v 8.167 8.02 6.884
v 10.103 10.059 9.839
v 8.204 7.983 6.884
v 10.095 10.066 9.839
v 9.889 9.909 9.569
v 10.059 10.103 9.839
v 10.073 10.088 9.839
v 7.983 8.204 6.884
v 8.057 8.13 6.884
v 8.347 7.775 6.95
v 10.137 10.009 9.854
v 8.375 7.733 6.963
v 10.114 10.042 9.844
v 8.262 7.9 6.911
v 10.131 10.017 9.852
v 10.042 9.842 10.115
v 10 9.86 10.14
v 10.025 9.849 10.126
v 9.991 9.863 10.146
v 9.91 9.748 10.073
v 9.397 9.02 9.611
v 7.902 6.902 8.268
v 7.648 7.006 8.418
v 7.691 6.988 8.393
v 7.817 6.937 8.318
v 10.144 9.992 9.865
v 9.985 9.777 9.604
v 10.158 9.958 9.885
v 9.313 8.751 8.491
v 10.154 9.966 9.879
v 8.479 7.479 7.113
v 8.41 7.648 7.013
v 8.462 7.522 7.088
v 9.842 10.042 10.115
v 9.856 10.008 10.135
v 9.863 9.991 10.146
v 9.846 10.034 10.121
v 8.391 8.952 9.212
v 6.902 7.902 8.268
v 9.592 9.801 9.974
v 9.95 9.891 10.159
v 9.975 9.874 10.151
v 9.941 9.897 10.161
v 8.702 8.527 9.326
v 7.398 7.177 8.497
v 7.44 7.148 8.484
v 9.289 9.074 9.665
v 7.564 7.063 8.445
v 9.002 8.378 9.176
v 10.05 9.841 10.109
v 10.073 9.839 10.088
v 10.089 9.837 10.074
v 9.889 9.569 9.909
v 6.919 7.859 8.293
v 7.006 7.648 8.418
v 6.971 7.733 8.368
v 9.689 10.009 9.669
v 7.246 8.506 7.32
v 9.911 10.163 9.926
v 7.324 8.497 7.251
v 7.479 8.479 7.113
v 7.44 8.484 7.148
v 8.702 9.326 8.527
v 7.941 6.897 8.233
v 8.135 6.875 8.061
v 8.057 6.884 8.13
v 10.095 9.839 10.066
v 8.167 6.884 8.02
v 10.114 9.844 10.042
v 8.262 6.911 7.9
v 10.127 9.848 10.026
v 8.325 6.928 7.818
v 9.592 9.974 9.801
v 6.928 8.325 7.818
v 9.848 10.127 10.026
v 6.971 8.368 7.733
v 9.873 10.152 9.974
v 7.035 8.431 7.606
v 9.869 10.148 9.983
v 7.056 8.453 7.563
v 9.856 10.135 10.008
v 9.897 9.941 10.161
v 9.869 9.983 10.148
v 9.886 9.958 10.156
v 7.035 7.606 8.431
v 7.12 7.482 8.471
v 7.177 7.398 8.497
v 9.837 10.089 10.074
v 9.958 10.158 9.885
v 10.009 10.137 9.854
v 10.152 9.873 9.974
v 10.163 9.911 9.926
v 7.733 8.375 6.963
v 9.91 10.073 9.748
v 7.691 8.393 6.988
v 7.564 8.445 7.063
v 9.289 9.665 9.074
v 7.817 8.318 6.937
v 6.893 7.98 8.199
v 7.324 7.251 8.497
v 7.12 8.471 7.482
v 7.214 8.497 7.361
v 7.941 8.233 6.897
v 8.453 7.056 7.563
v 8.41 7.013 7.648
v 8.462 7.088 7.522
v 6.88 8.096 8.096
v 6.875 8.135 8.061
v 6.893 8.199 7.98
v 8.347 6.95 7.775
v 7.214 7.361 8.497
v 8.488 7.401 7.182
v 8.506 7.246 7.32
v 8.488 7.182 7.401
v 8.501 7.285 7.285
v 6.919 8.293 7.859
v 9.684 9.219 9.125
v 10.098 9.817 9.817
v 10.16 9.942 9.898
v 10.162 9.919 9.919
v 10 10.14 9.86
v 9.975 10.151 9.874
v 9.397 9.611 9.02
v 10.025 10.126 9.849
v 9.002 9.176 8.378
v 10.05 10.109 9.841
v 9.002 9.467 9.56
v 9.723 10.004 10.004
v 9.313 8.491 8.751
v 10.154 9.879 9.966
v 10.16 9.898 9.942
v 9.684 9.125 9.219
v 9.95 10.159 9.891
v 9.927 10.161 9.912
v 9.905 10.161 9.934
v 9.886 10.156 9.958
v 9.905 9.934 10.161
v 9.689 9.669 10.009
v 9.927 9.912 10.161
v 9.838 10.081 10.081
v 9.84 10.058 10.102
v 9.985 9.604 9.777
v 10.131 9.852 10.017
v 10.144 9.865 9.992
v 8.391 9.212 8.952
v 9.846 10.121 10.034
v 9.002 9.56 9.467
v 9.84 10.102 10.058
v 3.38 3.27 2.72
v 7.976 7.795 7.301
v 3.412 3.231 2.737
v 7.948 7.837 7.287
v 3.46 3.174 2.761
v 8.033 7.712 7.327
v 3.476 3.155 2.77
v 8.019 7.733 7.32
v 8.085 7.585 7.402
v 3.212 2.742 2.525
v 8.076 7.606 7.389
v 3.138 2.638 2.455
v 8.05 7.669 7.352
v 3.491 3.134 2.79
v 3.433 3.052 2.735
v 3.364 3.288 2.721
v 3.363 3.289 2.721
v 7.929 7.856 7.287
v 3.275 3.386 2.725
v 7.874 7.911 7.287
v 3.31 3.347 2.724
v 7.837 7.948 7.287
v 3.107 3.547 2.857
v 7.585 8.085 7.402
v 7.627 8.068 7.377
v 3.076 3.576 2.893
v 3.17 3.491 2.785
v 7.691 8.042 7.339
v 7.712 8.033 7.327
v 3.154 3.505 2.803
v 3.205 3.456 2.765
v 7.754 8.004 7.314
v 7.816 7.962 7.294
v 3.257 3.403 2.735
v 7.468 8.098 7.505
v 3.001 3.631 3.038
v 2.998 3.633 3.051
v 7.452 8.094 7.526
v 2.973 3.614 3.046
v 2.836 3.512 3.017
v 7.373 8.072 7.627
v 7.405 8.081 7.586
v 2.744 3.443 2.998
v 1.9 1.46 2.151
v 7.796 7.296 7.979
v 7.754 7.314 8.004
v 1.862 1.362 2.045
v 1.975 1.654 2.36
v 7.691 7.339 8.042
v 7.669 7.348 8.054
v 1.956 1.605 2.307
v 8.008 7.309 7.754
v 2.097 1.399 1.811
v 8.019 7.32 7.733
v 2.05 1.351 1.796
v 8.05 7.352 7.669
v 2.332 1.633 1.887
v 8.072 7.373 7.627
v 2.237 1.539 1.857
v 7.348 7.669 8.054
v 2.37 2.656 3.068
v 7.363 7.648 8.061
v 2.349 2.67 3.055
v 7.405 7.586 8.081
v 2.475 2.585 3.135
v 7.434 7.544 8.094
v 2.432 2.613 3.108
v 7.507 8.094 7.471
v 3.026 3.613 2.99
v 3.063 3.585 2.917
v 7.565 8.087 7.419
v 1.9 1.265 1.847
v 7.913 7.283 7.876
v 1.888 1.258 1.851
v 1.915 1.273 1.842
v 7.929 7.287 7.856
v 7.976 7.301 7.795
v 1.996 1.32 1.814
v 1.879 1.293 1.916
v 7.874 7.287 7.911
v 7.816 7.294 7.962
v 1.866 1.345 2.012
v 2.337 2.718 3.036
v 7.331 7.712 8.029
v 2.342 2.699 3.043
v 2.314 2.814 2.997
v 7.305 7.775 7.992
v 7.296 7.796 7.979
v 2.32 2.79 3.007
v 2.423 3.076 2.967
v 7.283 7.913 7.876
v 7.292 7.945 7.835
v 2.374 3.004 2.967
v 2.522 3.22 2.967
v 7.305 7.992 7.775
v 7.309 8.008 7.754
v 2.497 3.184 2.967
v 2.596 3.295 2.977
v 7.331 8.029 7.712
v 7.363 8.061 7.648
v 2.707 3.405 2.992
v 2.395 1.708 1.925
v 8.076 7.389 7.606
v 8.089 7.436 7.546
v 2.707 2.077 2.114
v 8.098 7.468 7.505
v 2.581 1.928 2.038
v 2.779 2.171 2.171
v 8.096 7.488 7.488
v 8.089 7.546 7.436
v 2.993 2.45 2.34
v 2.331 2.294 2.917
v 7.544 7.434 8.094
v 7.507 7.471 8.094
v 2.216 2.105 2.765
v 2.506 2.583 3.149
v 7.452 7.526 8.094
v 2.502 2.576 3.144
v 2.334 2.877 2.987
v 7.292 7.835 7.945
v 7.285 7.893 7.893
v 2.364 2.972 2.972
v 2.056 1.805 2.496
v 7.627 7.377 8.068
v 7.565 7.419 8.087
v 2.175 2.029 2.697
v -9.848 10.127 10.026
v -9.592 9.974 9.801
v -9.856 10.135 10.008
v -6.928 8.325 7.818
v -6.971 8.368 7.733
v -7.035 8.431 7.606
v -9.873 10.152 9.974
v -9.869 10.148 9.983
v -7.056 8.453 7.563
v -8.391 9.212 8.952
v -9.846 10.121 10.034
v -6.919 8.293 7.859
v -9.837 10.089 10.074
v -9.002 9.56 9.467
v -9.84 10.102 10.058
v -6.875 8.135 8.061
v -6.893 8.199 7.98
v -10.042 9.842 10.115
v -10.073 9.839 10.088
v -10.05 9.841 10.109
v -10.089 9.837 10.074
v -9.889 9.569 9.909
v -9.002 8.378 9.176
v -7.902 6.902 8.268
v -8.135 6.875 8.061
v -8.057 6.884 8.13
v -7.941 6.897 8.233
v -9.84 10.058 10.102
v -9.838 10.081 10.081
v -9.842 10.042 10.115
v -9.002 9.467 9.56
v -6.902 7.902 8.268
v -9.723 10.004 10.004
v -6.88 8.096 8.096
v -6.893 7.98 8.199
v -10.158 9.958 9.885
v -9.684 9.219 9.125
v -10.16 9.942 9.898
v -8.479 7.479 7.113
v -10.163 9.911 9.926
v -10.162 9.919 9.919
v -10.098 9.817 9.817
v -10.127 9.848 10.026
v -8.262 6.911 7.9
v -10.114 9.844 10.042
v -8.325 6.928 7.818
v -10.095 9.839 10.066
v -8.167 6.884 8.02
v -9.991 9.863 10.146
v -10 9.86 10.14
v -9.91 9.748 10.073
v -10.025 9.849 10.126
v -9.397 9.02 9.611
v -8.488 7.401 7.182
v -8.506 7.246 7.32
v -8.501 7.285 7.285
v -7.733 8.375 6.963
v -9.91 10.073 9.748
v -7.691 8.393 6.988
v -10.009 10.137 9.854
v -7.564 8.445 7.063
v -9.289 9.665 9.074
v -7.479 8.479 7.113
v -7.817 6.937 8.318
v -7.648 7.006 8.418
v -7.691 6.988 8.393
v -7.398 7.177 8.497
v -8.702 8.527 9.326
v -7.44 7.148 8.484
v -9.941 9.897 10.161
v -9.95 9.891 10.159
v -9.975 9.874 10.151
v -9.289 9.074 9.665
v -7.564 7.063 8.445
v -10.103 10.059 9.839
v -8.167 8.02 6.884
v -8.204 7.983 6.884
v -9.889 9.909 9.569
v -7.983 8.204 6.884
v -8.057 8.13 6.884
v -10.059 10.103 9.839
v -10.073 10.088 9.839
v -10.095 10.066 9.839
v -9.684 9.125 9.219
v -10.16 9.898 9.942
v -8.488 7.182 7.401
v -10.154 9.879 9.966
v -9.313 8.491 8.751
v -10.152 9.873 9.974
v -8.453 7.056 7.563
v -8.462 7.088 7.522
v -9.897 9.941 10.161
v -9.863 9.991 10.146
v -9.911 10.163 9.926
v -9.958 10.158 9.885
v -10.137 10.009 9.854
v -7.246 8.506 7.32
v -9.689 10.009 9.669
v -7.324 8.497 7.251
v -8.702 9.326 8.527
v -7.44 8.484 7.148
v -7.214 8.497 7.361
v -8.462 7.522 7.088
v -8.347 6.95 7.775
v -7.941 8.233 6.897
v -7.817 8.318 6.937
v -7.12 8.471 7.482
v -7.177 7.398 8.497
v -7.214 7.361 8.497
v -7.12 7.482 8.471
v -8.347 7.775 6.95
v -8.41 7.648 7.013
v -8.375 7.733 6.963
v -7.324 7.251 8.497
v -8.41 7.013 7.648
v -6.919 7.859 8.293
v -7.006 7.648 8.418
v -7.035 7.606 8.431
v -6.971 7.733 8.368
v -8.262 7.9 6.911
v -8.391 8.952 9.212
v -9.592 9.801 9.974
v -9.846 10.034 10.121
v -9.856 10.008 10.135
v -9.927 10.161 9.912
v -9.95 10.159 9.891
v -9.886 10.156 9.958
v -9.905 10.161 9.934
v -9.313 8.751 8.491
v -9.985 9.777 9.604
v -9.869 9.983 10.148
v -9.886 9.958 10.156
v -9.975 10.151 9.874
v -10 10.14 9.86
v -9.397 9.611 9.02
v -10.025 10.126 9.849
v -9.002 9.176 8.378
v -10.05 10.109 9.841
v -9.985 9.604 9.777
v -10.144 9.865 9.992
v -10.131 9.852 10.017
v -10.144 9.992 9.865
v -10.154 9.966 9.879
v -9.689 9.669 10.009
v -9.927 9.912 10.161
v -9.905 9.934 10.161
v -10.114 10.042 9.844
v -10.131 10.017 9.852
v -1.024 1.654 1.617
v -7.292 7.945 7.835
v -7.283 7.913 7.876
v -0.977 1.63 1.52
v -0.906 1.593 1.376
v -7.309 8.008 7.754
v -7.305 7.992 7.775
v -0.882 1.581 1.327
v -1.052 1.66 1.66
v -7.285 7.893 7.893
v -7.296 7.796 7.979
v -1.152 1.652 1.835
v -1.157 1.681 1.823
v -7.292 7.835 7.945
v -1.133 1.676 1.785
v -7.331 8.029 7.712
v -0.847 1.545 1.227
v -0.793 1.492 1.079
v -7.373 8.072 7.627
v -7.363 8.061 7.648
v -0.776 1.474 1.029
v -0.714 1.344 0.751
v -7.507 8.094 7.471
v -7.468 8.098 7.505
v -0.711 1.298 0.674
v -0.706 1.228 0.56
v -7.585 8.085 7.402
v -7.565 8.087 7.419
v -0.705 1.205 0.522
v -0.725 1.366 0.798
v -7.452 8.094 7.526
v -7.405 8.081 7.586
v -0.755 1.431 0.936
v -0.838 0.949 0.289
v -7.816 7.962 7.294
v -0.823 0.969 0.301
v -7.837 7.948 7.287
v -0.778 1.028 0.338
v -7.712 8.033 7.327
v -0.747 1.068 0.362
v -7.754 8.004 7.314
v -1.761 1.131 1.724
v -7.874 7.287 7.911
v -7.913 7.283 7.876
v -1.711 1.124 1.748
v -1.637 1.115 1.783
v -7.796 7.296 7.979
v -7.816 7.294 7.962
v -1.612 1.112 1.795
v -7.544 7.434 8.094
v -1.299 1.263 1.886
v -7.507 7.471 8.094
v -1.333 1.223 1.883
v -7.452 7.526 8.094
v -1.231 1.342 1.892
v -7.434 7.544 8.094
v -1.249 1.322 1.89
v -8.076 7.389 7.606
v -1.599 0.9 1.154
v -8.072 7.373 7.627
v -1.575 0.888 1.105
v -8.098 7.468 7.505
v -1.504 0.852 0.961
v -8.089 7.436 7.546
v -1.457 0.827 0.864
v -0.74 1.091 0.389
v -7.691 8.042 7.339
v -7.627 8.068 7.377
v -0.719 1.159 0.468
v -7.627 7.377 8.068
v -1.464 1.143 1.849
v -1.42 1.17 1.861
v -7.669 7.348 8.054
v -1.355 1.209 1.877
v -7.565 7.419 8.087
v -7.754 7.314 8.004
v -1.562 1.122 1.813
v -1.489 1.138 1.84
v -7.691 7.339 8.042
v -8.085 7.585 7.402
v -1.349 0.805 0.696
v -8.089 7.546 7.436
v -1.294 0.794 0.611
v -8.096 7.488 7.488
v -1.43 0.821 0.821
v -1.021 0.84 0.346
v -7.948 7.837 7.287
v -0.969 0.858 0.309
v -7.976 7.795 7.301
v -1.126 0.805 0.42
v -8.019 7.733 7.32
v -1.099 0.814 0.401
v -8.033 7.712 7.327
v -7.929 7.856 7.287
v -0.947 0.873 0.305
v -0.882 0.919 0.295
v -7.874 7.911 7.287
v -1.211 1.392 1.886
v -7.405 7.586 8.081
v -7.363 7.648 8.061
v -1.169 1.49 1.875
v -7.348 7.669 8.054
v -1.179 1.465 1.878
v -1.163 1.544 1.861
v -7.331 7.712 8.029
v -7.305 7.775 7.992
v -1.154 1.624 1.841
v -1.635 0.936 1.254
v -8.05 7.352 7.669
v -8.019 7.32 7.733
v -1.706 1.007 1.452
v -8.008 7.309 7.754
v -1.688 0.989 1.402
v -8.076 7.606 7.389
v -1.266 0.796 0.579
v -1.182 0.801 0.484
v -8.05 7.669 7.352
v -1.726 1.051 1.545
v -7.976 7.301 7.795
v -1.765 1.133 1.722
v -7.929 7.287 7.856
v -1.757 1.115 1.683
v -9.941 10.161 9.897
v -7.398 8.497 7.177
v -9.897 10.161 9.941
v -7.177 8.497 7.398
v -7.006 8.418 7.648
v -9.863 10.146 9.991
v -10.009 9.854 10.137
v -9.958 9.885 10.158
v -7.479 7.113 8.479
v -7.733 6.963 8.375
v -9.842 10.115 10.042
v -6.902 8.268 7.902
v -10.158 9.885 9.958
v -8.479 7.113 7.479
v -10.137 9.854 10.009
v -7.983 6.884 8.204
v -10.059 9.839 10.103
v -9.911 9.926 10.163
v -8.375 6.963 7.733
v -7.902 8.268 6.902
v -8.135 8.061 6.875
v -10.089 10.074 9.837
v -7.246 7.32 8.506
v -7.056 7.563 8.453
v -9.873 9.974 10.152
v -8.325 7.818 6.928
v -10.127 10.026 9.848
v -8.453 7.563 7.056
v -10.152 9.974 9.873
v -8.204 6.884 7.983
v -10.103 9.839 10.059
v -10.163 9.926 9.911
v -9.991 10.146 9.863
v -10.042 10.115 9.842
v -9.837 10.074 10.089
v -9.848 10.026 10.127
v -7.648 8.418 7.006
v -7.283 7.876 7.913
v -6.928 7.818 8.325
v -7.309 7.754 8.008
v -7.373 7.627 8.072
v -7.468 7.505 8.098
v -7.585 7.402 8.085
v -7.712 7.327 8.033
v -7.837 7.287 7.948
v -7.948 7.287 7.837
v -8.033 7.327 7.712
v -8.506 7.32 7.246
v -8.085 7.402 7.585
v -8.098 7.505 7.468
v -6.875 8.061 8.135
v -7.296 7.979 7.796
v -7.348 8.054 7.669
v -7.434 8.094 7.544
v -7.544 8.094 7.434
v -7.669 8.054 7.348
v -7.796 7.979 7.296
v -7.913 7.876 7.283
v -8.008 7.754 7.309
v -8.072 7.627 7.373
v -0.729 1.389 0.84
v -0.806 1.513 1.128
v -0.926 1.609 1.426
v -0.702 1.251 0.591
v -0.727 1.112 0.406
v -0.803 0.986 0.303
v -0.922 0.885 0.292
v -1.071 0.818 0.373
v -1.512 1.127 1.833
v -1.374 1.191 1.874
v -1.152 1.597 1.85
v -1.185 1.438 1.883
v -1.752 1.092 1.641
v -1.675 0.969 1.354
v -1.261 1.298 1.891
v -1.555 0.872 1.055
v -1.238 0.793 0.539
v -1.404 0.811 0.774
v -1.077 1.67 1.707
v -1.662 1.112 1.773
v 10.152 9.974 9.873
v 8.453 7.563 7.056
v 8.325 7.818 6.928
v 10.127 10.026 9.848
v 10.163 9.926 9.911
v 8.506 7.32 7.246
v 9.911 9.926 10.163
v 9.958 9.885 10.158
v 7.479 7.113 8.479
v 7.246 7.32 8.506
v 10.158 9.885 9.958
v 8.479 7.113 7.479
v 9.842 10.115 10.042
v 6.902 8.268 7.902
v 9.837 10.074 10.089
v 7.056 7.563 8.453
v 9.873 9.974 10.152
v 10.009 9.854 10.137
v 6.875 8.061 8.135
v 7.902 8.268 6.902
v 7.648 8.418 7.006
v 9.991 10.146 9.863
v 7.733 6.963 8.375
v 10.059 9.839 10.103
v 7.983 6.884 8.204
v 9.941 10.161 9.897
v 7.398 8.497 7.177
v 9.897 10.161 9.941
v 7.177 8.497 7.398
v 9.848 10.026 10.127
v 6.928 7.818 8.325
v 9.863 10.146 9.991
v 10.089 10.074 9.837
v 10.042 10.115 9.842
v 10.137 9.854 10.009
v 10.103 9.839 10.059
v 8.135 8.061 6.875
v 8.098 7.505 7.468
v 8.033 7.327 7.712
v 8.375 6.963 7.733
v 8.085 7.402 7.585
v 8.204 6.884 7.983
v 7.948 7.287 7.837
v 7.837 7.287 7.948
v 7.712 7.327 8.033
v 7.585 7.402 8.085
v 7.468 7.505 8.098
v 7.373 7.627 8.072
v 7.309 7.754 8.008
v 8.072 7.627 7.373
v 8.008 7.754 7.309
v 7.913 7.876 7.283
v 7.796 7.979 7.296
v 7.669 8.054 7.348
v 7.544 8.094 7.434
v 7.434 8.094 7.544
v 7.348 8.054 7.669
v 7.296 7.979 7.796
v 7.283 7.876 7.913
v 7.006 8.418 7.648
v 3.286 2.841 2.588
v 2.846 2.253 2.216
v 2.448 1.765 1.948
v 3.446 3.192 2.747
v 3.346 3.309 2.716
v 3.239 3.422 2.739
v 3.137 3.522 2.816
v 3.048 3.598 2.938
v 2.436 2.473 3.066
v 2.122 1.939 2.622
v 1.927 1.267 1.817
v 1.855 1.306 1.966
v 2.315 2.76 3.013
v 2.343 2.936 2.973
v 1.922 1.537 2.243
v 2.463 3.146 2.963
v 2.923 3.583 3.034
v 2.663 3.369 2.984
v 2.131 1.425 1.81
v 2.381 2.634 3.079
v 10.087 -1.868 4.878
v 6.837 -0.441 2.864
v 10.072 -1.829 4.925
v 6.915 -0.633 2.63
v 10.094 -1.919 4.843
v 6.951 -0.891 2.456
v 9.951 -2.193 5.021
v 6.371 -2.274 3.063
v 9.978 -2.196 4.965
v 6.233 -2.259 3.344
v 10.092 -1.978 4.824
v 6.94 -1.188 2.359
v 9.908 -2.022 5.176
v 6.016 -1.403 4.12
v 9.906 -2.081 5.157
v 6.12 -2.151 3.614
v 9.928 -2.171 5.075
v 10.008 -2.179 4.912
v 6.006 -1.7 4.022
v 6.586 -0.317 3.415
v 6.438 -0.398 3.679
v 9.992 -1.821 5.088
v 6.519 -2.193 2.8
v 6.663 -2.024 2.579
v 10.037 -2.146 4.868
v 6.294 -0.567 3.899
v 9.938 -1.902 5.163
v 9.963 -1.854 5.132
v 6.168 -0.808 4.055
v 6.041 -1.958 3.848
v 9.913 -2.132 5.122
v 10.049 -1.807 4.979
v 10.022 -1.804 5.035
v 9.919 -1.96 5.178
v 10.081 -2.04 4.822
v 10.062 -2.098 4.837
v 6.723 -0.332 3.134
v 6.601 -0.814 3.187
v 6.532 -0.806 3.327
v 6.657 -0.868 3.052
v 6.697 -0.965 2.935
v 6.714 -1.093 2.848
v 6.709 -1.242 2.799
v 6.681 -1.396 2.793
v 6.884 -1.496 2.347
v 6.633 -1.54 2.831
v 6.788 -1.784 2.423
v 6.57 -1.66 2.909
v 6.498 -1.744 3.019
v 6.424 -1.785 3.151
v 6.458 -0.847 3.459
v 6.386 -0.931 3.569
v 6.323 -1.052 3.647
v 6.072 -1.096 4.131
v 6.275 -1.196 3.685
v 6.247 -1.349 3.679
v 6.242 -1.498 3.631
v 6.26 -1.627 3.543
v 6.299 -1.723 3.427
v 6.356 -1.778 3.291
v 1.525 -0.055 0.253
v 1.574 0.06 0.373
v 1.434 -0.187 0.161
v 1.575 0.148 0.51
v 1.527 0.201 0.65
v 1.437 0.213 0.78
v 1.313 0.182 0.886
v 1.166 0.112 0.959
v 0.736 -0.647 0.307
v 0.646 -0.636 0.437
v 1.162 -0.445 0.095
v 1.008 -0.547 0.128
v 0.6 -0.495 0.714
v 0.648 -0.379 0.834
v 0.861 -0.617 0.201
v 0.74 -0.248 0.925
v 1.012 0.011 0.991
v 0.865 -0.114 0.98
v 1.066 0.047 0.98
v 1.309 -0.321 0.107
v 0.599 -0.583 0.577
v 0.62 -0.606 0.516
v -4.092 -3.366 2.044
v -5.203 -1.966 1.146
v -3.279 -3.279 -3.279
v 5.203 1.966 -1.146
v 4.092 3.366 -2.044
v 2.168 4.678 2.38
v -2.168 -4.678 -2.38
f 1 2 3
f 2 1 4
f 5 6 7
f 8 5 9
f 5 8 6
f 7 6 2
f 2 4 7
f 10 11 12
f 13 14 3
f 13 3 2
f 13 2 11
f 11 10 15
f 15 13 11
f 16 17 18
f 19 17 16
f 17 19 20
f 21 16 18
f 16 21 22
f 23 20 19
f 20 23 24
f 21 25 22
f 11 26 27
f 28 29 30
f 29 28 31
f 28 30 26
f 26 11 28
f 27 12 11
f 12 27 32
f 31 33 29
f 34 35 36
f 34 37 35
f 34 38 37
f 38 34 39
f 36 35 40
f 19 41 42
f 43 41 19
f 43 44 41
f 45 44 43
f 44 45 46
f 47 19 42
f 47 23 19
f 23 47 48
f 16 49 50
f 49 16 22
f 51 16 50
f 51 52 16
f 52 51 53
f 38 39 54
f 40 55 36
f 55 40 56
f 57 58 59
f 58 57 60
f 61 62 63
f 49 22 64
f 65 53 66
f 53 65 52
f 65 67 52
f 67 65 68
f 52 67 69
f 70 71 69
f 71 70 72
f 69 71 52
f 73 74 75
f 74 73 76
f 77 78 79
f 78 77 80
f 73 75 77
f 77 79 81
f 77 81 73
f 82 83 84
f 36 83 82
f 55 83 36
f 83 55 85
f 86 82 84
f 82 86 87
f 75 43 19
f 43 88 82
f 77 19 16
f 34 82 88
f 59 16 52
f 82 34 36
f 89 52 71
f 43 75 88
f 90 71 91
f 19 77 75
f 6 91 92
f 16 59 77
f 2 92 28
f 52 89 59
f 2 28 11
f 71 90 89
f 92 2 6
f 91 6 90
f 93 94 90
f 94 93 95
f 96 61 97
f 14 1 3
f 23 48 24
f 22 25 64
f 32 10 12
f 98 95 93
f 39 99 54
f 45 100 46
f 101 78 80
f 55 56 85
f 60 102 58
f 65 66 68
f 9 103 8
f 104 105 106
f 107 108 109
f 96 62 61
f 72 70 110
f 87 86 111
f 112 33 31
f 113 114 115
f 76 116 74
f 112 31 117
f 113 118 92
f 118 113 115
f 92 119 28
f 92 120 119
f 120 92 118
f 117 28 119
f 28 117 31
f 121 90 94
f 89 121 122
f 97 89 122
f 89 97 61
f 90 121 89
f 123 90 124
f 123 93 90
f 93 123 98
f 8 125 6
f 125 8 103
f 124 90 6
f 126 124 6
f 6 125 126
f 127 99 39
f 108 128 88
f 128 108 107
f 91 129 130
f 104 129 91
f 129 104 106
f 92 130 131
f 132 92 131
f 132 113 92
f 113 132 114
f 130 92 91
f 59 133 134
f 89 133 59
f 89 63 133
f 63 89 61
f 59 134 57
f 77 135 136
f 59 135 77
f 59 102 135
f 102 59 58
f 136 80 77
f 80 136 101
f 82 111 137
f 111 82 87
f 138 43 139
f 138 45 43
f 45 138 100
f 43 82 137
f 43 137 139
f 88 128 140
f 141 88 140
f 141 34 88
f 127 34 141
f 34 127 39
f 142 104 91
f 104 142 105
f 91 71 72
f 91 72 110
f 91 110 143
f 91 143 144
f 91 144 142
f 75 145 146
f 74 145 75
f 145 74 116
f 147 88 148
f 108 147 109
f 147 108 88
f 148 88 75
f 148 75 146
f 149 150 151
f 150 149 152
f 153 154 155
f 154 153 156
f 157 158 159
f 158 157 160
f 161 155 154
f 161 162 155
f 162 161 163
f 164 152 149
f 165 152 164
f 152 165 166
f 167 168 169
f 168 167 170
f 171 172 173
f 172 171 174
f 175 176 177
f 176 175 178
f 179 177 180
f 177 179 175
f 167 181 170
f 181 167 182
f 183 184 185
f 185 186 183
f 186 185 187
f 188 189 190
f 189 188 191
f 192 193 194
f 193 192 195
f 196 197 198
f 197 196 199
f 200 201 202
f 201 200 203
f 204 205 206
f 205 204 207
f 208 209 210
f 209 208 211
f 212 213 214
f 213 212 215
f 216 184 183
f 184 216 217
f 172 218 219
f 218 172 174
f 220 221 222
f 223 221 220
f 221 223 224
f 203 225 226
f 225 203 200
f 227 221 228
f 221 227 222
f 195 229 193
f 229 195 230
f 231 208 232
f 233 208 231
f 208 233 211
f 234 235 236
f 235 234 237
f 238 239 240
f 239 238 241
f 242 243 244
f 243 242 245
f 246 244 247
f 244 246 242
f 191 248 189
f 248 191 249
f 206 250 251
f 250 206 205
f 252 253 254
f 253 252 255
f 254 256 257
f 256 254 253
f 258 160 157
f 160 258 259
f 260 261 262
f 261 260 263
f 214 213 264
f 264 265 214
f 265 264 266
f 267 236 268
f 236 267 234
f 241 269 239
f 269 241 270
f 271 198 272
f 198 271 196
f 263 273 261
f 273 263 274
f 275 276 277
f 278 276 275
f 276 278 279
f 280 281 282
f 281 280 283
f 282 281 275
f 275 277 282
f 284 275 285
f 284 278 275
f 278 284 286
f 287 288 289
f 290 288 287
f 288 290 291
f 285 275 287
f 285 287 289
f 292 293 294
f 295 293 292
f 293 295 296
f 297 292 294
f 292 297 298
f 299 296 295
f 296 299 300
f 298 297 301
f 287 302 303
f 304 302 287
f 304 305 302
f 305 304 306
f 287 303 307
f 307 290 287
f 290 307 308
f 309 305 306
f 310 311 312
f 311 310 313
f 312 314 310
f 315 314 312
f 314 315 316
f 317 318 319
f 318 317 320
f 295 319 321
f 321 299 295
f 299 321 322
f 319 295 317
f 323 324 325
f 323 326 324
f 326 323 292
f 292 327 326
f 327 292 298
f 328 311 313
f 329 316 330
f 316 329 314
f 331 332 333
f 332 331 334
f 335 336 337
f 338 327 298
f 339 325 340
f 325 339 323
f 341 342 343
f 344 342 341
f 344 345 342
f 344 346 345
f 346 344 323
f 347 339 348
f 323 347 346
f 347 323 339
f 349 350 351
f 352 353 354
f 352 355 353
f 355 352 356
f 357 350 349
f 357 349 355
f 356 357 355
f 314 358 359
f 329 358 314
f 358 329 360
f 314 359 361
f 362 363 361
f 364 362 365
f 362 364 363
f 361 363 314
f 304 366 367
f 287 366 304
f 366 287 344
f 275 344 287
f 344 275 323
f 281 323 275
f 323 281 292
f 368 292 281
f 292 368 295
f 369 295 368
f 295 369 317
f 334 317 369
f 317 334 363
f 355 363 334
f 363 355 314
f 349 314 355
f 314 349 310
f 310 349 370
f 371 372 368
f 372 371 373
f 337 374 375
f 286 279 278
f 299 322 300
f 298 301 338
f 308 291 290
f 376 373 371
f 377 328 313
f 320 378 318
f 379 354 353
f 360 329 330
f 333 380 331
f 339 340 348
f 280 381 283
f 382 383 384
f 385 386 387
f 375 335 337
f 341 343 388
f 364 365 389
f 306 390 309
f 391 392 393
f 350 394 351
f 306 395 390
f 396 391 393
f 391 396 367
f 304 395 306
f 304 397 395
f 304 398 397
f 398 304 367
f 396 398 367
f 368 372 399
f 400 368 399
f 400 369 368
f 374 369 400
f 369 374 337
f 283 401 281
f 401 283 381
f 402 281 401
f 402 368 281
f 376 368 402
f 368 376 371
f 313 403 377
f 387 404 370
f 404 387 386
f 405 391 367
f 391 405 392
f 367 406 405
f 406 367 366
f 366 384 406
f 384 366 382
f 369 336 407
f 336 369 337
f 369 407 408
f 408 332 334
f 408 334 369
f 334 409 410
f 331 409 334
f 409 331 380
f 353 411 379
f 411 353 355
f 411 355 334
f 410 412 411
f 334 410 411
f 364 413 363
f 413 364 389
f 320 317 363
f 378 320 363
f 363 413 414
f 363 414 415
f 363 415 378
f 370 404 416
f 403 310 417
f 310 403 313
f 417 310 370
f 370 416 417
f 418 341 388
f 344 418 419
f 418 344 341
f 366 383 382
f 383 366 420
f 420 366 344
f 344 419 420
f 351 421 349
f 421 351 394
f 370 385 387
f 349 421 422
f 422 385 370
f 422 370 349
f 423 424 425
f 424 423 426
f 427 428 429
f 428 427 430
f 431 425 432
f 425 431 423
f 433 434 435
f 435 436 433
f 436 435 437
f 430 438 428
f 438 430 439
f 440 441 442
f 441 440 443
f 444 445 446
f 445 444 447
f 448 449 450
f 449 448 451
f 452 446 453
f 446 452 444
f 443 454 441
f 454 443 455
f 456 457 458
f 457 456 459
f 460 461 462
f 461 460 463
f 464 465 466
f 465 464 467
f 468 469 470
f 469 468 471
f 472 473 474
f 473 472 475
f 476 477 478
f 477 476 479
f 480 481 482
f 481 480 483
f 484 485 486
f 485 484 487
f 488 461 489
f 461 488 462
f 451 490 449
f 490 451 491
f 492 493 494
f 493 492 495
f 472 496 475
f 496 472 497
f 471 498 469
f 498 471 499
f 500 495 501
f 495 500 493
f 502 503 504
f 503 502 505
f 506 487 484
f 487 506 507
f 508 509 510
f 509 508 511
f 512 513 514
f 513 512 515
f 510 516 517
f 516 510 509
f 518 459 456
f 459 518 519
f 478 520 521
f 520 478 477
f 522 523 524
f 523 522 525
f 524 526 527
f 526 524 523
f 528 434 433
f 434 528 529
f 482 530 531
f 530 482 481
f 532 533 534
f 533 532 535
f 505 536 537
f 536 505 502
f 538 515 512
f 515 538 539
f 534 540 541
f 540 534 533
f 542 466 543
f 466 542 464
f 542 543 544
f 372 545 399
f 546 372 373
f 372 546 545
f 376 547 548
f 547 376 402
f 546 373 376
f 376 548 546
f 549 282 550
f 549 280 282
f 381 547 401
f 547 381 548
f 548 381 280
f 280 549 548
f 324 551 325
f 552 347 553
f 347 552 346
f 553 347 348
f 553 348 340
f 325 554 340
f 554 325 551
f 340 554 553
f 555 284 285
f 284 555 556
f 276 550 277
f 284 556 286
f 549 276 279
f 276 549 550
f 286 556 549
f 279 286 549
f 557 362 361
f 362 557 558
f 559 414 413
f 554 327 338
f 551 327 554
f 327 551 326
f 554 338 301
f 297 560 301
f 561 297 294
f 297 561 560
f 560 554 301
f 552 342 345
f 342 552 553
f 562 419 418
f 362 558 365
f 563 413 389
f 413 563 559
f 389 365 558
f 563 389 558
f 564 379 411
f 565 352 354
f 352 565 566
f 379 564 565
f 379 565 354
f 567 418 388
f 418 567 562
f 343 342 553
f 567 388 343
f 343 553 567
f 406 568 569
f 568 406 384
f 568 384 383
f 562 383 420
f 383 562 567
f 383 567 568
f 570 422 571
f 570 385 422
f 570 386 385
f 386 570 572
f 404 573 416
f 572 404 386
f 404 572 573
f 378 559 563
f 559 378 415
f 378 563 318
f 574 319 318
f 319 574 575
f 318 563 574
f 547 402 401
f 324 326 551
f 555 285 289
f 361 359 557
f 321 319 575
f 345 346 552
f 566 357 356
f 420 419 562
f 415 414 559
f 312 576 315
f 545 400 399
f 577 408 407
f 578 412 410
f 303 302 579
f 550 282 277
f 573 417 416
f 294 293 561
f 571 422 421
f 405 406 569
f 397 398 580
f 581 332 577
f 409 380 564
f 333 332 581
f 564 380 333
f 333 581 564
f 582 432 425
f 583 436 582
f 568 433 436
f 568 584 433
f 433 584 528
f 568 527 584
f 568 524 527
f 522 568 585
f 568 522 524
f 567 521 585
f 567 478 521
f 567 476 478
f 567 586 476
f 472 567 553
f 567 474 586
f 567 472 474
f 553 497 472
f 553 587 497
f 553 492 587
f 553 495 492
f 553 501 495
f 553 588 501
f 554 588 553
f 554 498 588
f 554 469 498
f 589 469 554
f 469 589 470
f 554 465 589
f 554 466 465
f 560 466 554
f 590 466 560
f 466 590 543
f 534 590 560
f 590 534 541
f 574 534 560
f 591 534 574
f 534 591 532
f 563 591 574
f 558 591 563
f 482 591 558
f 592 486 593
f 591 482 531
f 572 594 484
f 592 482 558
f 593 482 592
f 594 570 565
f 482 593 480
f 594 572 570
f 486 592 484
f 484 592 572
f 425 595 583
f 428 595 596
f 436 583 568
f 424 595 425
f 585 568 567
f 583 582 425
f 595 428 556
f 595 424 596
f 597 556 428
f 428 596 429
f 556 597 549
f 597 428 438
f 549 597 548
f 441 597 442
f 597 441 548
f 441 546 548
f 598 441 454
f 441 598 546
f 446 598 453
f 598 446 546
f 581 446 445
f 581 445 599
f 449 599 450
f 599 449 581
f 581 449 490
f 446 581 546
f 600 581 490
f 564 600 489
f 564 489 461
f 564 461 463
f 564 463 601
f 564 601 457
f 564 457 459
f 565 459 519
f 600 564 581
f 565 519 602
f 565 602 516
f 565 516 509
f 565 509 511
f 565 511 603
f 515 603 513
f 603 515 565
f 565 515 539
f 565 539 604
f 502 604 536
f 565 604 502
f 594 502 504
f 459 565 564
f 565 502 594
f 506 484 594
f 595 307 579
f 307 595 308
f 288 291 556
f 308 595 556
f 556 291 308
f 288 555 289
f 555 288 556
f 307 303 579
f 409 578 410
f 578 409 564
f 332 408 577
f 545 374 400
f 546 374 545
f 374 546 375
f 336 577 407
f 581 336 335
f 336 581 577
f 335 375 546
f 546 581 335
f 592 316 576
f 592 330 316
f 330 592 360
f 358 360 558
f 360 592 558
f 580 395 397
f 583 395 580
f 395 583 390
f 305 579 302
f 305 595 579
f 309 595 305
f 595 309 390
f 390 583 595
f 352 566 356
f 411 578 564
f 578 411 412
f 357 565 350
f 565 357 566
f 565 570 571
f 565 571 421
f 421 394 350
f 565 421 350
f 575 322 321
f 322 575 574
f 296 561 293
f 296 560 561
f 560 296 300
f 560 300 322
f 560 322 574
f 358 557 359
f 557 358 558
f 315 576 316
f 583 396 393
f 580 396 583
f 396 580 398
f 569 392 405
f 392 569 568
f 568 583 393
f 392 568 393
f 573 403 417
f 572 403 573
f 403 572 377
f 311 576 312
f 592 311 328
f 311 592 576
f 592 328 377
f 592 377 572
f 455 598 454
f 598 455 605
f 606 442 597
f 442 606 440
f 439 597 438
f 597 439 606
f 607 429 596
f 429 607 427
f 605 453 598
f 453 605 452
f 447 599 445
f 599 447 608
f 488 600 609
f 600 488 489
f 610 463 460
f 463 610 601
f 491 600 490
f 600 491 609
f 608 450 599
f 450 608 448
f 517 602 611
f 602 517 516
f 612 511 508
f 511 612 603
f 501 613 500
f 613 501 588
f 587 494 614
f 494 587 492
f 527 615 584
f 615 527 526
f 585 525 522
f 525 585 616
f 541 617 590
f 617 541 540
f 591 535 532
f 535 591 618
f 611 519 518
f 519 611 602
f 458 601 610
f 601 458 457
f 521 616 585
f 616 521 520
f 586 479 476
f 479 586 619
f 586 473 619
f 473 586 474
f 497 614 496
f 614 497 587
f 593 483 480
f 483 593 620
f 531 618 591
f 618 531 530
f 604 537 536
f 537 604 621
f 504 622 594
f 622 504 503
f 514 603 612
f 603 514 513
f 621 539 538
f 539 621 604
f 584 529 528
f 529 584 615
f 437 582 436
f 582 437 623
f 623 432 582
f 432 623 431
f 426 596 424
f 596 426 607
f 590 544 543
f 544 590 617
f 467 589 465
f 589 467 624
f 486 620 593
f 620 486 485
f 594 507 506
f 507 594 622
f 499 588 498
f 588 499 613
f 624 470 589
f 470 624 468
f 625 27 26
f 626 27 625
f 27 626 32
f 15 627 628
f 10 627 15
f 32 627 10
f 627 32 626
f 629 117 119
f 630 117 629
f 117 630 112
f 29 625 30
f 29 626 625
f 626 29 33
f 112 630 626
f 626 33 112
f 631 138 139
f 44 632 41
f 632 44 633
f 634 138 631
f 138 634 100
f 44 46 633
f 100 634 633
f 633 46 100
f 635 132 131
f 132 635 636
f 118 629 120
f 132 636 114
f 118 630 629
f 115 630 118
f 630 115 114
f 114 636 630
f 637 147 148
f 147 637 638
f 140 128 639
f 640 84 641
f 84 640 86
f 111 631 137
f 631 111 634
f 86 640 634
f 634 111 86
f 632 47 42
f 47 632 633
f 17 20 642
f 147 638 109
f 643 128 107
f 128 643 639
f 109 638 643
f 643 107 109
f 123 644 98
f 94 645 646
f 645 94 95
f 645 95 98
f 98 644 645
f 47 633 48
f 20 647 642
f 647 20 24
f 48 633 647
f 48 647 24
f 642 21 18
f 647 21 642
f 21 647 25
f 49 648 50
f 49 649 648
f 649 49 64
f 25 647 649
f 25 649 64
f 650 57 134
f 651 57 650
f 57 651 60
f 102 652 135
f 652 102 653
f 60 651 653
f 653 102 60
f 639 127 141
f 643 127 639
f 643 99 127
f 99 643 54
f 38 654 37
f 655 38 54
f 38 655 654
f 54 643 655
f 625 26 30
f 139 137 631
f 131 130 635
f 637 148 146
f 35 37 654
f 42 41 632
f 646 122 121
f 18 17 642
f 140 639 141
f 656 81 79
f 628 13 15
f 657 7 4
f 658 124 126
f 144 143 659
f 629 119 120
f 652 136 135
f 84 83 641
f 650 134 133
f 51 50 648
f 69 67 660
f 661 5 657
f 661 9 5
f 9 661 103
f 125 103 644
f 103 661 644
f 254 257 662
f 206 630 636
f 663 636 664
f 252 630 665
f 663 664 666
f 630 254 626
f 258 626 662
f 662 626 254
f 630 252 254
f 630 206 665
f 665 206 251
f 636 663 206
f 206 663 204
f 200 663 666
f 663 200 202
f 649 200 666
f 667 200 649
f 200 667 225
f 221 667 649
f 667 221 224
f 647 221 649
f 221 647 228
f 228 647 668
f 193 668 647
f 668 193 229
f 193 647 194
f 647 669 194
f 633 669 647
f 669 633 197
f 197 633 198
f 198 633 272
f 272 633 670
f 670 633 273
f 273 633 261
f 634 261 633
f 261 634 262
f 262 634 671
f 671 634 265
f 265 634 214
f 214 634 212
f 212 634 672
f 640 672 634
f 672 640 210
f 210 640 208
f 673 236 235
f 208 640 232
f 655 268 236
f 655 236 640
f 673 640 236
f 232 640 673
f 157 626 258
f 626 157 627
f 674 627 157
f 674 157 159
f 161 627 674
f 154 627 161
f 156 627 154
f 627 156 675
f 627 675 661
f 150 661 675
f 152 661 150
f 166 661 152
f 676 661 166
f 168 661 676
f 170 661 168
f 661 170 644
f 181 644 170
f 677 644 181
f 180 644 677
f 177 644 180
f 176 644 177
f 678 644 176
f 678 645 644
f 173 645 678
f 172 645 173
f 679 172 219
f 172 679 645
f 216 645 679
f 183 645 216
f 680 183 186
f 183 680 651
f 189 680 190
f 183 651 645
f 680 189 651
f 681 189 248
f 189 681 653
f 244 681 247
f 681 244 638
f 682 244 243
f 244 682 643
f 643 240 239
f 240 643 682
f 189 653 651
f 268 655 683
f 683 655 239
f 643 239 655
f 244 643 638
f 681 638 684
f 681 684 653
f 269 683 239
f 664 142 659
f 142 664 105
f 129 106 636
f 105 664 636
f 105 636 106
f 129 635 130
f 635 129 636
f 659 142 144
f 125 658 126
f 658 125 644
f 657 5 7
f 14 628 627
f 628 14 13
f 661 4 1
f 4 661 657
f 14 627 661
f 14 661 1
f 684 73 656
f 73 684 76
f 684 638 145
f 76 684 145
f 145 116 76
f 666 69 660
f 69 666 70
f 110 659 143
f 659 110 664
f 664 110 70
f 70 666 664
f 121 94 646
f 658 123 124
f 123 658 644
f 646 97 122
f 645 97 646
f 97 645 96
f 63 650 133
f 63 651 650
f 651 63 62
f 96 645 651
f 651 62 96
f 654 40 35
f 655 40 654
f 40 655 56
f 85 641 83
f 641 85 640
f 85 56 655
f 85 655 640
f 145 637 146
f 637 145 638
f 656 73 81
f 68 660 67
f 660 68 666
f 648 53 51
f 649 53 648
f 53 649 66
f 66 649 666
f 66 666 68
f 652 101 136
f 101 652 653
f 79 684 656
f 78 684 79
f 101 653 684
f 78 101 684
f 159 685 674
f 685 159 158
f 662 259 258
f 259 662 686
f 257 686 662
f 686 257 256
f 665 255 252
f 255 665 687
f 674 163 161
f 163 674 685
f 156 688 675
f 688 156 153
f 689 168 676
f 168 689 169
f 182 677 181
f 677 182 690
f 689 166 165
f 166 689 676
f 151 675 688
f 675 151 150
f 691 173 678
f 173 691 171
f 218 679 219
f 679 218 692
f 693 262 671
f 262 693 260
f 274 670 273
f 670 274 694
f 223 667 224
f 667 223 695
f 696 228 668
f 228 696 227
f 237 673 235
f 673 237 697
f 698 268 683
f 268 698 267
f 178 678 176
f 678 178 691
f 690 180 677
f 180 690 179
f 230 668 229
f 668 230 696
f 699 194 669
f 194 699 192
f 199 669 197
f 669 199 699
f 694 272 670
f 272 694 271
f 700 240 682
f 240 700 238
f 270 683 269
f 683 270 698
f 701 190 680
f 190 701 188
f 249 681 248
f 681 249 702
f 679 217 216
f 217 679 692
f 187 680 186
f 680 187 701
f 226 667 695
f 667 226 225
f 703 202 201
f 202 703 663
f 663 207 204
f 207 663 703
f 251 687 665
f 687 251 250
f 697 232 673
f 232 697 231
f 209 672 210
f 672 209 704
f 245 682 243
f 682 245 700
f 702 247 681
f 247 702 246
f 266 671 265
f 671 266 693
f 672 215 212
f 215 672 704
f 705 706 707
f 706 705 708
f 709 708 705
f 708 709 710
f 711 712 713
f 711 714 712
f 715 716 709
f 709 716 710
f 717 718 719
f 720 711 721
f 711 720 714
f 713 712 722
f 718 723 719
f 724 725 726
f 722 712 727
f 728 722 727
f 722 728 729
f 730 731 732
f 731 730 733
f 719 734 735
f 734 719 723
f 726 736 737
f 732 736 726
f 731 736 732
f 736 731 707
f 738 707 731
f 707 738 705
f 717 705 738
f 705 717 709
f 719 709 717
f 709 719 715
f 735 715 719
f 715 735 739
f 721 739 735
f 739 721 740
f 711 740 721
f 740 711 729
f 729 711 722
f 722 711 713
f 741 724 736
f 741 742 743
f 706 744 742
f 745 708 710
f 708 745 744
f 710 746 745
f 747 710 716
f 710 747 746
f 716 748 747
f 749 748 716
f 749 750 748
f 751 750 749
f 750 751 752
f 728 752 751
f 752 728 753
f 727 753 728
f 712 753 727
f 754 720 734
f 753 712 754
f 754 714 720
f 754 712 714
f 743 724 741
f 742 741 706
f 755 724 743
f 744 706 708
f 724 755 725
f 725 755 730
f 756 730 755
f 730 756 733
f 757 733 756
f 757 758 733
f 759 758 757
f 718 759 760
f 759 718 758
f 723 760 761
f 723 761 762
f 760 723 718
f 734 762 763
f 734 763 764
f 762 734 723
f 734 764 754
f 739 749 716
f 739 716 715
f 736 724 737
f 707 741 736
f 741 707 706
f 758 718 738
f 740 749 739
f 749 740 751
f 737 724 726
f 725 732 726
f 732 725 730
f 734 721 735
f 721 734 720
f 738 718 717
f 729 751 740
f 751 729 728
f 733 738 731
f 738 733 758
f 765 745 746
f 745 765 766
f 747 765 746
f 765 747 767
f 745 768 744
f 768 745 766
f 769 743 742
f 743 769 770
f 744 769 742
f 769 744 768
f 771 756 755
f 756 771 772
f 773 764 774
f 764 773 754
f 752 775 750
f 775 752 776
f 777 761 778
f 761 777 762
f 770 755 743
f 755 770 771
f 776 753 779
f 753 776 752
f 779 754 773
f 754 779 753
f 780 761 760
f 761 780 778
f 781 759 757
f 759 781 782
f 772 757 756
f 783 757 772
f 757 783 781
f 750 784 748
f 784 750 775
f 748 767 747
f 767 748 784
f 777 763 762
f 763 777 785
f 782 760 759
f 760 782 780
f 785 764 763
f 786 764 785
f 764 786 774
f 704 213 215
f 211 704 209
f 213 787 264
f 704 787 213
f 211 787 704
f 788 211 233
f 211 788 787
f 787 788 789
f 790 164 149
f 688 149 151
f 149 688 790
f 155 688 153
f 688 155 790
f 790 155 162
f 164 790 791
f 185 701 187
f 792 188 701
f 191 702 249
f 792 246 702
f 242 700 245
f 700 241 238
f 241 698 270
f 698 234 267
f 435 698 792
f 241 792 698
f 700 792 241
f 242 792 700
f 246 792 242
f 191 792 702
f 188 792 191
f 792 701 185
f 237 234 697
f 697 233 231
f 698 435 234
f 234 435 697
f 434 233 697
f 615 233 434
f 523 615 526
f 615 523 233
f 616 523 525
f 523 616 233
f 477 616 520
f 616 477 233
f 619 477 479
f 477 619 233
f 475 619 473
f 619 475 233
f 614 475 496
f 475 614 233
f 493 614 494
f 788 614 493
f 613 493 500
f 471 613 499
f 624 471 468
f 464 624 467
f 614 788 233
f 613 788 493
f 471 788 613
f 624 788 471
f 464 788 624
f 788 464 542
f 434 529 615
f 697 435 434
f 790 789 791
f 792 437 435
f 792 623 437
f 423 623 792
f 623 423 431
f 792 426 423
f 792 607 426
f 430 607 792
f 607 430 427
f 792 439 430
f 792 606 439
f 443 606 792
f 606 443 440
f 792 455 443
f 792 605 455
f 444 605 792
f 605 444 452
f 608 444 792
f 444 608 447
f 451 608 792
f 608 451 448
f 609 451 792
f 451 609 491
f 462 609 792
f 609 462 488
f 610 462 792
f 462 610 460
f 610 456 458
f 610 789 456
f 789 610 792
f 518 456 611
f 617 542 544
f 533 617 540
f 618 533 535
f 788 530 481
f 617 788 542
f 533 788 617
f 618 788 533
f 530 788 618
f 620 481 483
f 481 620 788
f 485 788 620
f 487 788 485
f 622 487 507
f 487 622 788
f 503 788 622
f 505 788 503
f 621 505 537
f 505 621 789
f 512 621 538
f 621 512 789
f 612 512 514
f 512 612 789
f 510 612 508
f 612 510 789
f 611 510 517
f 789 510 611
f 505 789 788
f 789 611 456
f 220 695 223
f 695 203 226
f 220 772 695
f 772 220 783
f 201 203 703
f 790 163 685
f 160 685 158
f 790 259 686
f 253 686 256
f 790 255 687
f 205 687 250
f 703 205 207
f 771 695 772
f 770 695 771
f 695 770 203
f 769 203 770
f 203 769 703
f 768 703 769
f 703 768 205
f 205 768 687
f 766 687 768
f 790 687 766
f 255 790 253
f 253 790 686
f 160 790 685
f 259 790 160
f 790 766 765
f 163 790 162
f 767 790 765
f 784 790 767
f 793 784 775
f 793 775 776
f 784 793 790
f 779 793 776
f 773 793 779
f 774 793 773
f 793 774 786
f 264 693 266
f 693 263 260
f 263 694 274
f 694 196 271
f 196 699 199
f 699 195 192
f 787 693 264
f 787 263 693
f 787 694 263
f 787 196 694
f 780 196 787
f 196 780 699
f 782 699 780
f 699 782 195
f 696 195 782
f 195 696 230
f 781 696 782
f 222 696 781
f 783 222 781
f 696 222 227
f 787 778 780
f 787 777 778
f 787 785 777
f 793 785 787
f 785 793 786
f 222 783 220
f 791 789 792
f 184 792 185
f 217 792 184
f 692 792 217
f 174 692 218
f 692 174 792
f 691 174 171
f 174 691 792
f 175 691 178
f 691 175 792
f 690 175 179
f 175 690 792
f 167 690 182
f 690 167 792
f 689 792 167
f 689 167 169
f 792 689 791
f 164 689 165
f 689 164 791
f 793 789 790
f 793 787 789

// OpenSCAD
//---------------------------------------------------------------
//-- Openscad vector library
//-- This is a component of the obiscad opescad tools by Obijuan
//-- (C) Juan Gonzalez-Gomez (Obijuan)
//-- Sep-2012
//---------------------------------------------------------------
//-- Released under the GPL license
//---------------------------------------------------------------

//-- Updated orientate function to correct singularity when v lies along vref

//----------------------------------------
//-- FUNCTIONS FOR WORKING WITH VECTORS
//----------------------------------------

//-- Calculate the module of a vector
function mod(v) = (sqrt(v[0]*v[0]+v[1]*v[1]+v[2]*v[2]));

//-- Calculate the cros product of two vectors
function cross(u,v) = [
  u[1]*v[2] - v[1]*u[2],
  -(u[0]*v[2] - v[0]*u[2]) ,
  u[0]*v[1] - v[0]*u[1]];

//-- Calculate the dot product of two vectors
function dot(u,v) = u[0]*v[0]+u[1]*v[1]+u[2]*v[2];

//-- Return the unit vector of a vector
function unitv(v) = v/mod(v);

//-- Return the angle between two vectores
function anglev(u,v) = acos( dot(u,v) / (mod(u)*mod(v)) );

//----------------------------------------------------------
//--  Draw a point in the position given by the vector p  
//----------------------------------------------------------
module point(p)
{
  translate(p)
    sphere(r=0.7,$fn=20);
}

//------------------------------------------------------------------
//-- Draw a vector poiting to the z axis
//-- This is an auxiliary module for implementing the vector module
//--
//-- Parameters:
//--  l: total vector length (line + arrow)
//--  l_arrow: Vector arrow length
//--  mark: If true, a mark is draw in the vector head, for having
//--    a visual reference of the rolling angle
//------------------------------------------------------------------
module vectorz(l=10, l_arrow=4, mark=false)
{
  //-- vector body length (not including the arrow)
  lb = l - l_arrow;

  //-- The vector is locatead at 0,0,0
  translate([0,0,lb/2])
  union() {

    //-- Draw the arrow
    translate([0,0,lb/2])
      cylinder(r1=2/2, r2=0.2, h=l_arrow, $fn=20);

    //-- Draw the mark
    if (mark) {
      translate([0,0,lb/2+l_arrow/2])
      translate([1,0,0])
        cube([2,0.3,l_arrow*0.8],center=true);
    }

    //-- Draw the body
    cylinder(r=1/2, h=lb, center=true, $fn=20);
  }

  //-- Draw a sphere in the vector base
  sphere(r=1/2, $fn=20);
}

//-----------------------------------------------------------------
//-- ORIENTATE OPERATOR
//--
//--  Orientate an object to the direction given by the vector v
//--  Parameters:
//--    v : Target orientation
//--    vref: Vector reference. It is the vector of the local frame
//--          of the object that want to be poiting in the direction
//--          of v
//--    roll: Rotation of the object around the v axis
//-------------------------------------------------------------------
module orientate(v,vref=[0,0,1], roll=0)
{
  //-- Calculate the rotation axis
  raxis = v[0]==vref[0] && v[1]==vref[1] ? [0,1,0] : cross(vref,v);
  
  //-- Calculate the angle between the vectors
  ang = anglev(vref,v);

  //-- Rotate the child!
  rotate(a=roll, v=v)
    rotate(a=ang, v=raxis)
      children(0);
}

module orientate2(v,vref=[0,0,1], roll=0)
{
  //-- Calculate the rotation axis
  raxis = cross(vref,v);
  
  //-- Calculate the angle between the vectors
  ang = anglev(vref,v);

  //-- Rotate the child!
  rotate(a=roll, v=v)
    rotate(a=ang, v=raxis)
      child(0);
}

//---------------------------------------------------------------------------
//-- Draw a vector 
//--
//-- There are two modes of drawing the vector
//-- * Mode 1: Given by a cartesian point(x,y,z). A vector from the origin
//--           to the end (x,y,z) is drawn. The l parameter (length) must 
//--           be 0  (l=0)
//-- * Mode 2: Give by direction and length
//--           A vector of length l pointing to the direction given by
//--           v is drawn
//---------------------------------------------------------------------------
//-- Parameters:
//--  v: Vector cartesian coordinates
//--  l: total vector length (line + arrow)
//--  l_arrow: Vector arrow length
//    mark: If true, a mark is draw in the vector head, for having
//--    a visual reference of the rolling angle
//---------------------------------------------------------------------------
module vector(v,l=0, l_arrow=4, mark=false)
{
  //-- Get the vector length from the coordinates
  mod = mod(v);

  //-- The vector is very easy implemented by means of the orientate
  //-- operator:
  //--  orientate(v) vectorz(l=mod, l_arrow=l_arrow)
  //--  BUT... in OPENSCAD 2012.02.22 the recursion does not
  //--    not work, so that if the user use the orientate operator
  //--    on a vector, openscad will ignore it..
  //-- The solution at the moment (I hope the openscad developers
  //--  implement the recursion in the near future...)
  //--  is to repite the orientate operation in this module

  //---- SAME CALCULATIONS THAN THE ORIENTATE OPERATOR!
  //-- Calculate the rotation axis

  vref = [0,0,1];
  raxis = cross(vref,v);
  
  //-- Calculate the angle between the vectors
  ang = anglev(vref,v);

  //-- orientate the vector
  //-- Draw the vector. The vector length is given either
  //--- by the mod variable (when l=0) or by l (when l!=0)
  if (l==0)
    rotate(a=ang, v=raxis)
      vectorz(l=mod, l_arrow=l_arrow, mark=mark);
  else
    rotate(a=ang, v=raxis)
      vectorz(l=l, l_arrow=l_arrow, mark=mark);

}

//----------------------------------------------------
//-- Draw a Frame of reference
//-- Parameters:
//-- l: length of the Unit vectors
//-----------------------------------------------------
module frame(l=10, l_arrow=4)
{

  //-- Z unit vector
  color("Blue")
    vector([0,0,l], l_arrow=l_arrow);

  //-- X unit vector
  color("Red")
    vector([l,0,0], l_arrow=l_arrow );

  //-- Y unit vector
  color("Green")
    vector([0,l,0],l_arrow=l_arrow);

  //-- Origin
  color("Gray")
    sphere(r=1, $fn=20);
}

//--------------------------------------------------
//-- Modules for testings and examples
//-- Testing that the vector library is working ok
//--------------------------------------------------

//-- 22 vectors in total are drawn, poiting to different directions
module Test_vectors1()
{

  a = 20;
  k = 1;

  //--  Add a frame of reference (in the origin)
  frame(l=a);

  //-- Negative vectors, pointing towards the three axis: -x, -y, -z
  color("Red")   vector([-a, 0,  0]);
  color("Green") vector([0, -a,  0]);
  color("Blue")  vector([0,  0, -a]);

  //-- It is *not* has been implemented using a for loop on purpose
  //-- This way, individual vectors can be commented out or highlighted

  //-- vectors with positive z
  vector([a,   a, a*k]);
  vector([0,   a, a*k]);
  vector([-a,  a, a*k]);
  vector([-a,  0, a*k]);

  vector([-a, -a, a*k]);
  vector([0,  -a, a*k]);
  vector([a,  -a, a*k]);
  vector([a,   0, a*k]);


  //-- Vectors with negative z
  vector([a,   a, -a*k]);
  vector([0,   a, -a*k]);
  vector([-a,  a, -a*k]);
  vector([-a,  0, -a*k]);

  vector([-a, -a, -a*k]);
  vector([0,  -a, -a*k]);
  vector([a,  -a, -a*k]);
  vector([a,   0, -a*k]);
}

//--- Another test...
module Test_vectors2()
{

  //-- Add the vector into the vector table
  //-- This vectors are taken as directions
  //-- All the vectors will be drawn with the same length (l)
  vector_table = [
    [1,   1, 1],
    [0,   1, 1],
    [-1,  1, 1],
    [-1,  0, 1],
    [-1, -1, 1],
    [0,  -1, 1],
    [1,  -1, 1],
    [1,   0, 1],
  
    [1,   1, -1],
    [0,   1, -1],
    [-1,  1, -1],
    [-1,  0, -1],
    [-1, -1, -1],
    [0,  -1, -1],
    [1,  -1, -1],
    [1,   0, -1],
  ];

  //-- Vector length
  l=20;

  frame(l=10);

  //-- Draw all the vector given in the table
  //-- The vectors point to the direction given in the table
  //-- They all are drawn with a length equal to l
  for (v=vector_table) {
    //-- Vector given by direction and length
    vector(v,l=l);
  }
}


//-- Test the cross product and the angle
//-- between vectors
module Test_vector3()
{
  //-- Start with 2 unit vectors
  v=unitv([1,1,1]);
  u=unitv([0,1,0]);

  //-- Draw the vector in different colors
  //-- Increase the length for drawing
  color("Red") vector(v*20);
  color("blue") vector(u*20);

  //-- Get the cross product
  w = cross(v,u);
  vector(w*20);

  //-- The cross product is NOT conmutative... 
  //-- change the order of v and u
  w2 = cross(u,v);
  vector(w2*20);

  //-- w should be perpendicular to v and u
  //-- Calculate the angles between them:
  echo("U , V: ", anglev(u,v));
  echo("W , U: ", anglev(w,u));
  echo("W , V: ", anglev(w,v));

}

//-- Test the orientate operator
module Test_vector4()
{
  o = [10,10,10];
  v = [-10,10,10];

  color("Red") vector(o);
  color("Blue") vector(v);

  //-- Orientate the vector o in the direction of v
  orientate(v,o)
    vector(o);

  //-- Inverse operation: orientate the v vector in the direction
  //-- of o
  orientate(o,v)
    vector(v);

  //-- Example of orientation of a cube
  orientate(o,vref=[10,-2,5],roll=0)
    cube([10,2,5],center=true);

  vector([10,-2,5]);

}

//-------- Perform tests......

Test_vector4();


/*

Test_vectors1();


translate([60,0,0]) 
  Test_vectors2();
*/
